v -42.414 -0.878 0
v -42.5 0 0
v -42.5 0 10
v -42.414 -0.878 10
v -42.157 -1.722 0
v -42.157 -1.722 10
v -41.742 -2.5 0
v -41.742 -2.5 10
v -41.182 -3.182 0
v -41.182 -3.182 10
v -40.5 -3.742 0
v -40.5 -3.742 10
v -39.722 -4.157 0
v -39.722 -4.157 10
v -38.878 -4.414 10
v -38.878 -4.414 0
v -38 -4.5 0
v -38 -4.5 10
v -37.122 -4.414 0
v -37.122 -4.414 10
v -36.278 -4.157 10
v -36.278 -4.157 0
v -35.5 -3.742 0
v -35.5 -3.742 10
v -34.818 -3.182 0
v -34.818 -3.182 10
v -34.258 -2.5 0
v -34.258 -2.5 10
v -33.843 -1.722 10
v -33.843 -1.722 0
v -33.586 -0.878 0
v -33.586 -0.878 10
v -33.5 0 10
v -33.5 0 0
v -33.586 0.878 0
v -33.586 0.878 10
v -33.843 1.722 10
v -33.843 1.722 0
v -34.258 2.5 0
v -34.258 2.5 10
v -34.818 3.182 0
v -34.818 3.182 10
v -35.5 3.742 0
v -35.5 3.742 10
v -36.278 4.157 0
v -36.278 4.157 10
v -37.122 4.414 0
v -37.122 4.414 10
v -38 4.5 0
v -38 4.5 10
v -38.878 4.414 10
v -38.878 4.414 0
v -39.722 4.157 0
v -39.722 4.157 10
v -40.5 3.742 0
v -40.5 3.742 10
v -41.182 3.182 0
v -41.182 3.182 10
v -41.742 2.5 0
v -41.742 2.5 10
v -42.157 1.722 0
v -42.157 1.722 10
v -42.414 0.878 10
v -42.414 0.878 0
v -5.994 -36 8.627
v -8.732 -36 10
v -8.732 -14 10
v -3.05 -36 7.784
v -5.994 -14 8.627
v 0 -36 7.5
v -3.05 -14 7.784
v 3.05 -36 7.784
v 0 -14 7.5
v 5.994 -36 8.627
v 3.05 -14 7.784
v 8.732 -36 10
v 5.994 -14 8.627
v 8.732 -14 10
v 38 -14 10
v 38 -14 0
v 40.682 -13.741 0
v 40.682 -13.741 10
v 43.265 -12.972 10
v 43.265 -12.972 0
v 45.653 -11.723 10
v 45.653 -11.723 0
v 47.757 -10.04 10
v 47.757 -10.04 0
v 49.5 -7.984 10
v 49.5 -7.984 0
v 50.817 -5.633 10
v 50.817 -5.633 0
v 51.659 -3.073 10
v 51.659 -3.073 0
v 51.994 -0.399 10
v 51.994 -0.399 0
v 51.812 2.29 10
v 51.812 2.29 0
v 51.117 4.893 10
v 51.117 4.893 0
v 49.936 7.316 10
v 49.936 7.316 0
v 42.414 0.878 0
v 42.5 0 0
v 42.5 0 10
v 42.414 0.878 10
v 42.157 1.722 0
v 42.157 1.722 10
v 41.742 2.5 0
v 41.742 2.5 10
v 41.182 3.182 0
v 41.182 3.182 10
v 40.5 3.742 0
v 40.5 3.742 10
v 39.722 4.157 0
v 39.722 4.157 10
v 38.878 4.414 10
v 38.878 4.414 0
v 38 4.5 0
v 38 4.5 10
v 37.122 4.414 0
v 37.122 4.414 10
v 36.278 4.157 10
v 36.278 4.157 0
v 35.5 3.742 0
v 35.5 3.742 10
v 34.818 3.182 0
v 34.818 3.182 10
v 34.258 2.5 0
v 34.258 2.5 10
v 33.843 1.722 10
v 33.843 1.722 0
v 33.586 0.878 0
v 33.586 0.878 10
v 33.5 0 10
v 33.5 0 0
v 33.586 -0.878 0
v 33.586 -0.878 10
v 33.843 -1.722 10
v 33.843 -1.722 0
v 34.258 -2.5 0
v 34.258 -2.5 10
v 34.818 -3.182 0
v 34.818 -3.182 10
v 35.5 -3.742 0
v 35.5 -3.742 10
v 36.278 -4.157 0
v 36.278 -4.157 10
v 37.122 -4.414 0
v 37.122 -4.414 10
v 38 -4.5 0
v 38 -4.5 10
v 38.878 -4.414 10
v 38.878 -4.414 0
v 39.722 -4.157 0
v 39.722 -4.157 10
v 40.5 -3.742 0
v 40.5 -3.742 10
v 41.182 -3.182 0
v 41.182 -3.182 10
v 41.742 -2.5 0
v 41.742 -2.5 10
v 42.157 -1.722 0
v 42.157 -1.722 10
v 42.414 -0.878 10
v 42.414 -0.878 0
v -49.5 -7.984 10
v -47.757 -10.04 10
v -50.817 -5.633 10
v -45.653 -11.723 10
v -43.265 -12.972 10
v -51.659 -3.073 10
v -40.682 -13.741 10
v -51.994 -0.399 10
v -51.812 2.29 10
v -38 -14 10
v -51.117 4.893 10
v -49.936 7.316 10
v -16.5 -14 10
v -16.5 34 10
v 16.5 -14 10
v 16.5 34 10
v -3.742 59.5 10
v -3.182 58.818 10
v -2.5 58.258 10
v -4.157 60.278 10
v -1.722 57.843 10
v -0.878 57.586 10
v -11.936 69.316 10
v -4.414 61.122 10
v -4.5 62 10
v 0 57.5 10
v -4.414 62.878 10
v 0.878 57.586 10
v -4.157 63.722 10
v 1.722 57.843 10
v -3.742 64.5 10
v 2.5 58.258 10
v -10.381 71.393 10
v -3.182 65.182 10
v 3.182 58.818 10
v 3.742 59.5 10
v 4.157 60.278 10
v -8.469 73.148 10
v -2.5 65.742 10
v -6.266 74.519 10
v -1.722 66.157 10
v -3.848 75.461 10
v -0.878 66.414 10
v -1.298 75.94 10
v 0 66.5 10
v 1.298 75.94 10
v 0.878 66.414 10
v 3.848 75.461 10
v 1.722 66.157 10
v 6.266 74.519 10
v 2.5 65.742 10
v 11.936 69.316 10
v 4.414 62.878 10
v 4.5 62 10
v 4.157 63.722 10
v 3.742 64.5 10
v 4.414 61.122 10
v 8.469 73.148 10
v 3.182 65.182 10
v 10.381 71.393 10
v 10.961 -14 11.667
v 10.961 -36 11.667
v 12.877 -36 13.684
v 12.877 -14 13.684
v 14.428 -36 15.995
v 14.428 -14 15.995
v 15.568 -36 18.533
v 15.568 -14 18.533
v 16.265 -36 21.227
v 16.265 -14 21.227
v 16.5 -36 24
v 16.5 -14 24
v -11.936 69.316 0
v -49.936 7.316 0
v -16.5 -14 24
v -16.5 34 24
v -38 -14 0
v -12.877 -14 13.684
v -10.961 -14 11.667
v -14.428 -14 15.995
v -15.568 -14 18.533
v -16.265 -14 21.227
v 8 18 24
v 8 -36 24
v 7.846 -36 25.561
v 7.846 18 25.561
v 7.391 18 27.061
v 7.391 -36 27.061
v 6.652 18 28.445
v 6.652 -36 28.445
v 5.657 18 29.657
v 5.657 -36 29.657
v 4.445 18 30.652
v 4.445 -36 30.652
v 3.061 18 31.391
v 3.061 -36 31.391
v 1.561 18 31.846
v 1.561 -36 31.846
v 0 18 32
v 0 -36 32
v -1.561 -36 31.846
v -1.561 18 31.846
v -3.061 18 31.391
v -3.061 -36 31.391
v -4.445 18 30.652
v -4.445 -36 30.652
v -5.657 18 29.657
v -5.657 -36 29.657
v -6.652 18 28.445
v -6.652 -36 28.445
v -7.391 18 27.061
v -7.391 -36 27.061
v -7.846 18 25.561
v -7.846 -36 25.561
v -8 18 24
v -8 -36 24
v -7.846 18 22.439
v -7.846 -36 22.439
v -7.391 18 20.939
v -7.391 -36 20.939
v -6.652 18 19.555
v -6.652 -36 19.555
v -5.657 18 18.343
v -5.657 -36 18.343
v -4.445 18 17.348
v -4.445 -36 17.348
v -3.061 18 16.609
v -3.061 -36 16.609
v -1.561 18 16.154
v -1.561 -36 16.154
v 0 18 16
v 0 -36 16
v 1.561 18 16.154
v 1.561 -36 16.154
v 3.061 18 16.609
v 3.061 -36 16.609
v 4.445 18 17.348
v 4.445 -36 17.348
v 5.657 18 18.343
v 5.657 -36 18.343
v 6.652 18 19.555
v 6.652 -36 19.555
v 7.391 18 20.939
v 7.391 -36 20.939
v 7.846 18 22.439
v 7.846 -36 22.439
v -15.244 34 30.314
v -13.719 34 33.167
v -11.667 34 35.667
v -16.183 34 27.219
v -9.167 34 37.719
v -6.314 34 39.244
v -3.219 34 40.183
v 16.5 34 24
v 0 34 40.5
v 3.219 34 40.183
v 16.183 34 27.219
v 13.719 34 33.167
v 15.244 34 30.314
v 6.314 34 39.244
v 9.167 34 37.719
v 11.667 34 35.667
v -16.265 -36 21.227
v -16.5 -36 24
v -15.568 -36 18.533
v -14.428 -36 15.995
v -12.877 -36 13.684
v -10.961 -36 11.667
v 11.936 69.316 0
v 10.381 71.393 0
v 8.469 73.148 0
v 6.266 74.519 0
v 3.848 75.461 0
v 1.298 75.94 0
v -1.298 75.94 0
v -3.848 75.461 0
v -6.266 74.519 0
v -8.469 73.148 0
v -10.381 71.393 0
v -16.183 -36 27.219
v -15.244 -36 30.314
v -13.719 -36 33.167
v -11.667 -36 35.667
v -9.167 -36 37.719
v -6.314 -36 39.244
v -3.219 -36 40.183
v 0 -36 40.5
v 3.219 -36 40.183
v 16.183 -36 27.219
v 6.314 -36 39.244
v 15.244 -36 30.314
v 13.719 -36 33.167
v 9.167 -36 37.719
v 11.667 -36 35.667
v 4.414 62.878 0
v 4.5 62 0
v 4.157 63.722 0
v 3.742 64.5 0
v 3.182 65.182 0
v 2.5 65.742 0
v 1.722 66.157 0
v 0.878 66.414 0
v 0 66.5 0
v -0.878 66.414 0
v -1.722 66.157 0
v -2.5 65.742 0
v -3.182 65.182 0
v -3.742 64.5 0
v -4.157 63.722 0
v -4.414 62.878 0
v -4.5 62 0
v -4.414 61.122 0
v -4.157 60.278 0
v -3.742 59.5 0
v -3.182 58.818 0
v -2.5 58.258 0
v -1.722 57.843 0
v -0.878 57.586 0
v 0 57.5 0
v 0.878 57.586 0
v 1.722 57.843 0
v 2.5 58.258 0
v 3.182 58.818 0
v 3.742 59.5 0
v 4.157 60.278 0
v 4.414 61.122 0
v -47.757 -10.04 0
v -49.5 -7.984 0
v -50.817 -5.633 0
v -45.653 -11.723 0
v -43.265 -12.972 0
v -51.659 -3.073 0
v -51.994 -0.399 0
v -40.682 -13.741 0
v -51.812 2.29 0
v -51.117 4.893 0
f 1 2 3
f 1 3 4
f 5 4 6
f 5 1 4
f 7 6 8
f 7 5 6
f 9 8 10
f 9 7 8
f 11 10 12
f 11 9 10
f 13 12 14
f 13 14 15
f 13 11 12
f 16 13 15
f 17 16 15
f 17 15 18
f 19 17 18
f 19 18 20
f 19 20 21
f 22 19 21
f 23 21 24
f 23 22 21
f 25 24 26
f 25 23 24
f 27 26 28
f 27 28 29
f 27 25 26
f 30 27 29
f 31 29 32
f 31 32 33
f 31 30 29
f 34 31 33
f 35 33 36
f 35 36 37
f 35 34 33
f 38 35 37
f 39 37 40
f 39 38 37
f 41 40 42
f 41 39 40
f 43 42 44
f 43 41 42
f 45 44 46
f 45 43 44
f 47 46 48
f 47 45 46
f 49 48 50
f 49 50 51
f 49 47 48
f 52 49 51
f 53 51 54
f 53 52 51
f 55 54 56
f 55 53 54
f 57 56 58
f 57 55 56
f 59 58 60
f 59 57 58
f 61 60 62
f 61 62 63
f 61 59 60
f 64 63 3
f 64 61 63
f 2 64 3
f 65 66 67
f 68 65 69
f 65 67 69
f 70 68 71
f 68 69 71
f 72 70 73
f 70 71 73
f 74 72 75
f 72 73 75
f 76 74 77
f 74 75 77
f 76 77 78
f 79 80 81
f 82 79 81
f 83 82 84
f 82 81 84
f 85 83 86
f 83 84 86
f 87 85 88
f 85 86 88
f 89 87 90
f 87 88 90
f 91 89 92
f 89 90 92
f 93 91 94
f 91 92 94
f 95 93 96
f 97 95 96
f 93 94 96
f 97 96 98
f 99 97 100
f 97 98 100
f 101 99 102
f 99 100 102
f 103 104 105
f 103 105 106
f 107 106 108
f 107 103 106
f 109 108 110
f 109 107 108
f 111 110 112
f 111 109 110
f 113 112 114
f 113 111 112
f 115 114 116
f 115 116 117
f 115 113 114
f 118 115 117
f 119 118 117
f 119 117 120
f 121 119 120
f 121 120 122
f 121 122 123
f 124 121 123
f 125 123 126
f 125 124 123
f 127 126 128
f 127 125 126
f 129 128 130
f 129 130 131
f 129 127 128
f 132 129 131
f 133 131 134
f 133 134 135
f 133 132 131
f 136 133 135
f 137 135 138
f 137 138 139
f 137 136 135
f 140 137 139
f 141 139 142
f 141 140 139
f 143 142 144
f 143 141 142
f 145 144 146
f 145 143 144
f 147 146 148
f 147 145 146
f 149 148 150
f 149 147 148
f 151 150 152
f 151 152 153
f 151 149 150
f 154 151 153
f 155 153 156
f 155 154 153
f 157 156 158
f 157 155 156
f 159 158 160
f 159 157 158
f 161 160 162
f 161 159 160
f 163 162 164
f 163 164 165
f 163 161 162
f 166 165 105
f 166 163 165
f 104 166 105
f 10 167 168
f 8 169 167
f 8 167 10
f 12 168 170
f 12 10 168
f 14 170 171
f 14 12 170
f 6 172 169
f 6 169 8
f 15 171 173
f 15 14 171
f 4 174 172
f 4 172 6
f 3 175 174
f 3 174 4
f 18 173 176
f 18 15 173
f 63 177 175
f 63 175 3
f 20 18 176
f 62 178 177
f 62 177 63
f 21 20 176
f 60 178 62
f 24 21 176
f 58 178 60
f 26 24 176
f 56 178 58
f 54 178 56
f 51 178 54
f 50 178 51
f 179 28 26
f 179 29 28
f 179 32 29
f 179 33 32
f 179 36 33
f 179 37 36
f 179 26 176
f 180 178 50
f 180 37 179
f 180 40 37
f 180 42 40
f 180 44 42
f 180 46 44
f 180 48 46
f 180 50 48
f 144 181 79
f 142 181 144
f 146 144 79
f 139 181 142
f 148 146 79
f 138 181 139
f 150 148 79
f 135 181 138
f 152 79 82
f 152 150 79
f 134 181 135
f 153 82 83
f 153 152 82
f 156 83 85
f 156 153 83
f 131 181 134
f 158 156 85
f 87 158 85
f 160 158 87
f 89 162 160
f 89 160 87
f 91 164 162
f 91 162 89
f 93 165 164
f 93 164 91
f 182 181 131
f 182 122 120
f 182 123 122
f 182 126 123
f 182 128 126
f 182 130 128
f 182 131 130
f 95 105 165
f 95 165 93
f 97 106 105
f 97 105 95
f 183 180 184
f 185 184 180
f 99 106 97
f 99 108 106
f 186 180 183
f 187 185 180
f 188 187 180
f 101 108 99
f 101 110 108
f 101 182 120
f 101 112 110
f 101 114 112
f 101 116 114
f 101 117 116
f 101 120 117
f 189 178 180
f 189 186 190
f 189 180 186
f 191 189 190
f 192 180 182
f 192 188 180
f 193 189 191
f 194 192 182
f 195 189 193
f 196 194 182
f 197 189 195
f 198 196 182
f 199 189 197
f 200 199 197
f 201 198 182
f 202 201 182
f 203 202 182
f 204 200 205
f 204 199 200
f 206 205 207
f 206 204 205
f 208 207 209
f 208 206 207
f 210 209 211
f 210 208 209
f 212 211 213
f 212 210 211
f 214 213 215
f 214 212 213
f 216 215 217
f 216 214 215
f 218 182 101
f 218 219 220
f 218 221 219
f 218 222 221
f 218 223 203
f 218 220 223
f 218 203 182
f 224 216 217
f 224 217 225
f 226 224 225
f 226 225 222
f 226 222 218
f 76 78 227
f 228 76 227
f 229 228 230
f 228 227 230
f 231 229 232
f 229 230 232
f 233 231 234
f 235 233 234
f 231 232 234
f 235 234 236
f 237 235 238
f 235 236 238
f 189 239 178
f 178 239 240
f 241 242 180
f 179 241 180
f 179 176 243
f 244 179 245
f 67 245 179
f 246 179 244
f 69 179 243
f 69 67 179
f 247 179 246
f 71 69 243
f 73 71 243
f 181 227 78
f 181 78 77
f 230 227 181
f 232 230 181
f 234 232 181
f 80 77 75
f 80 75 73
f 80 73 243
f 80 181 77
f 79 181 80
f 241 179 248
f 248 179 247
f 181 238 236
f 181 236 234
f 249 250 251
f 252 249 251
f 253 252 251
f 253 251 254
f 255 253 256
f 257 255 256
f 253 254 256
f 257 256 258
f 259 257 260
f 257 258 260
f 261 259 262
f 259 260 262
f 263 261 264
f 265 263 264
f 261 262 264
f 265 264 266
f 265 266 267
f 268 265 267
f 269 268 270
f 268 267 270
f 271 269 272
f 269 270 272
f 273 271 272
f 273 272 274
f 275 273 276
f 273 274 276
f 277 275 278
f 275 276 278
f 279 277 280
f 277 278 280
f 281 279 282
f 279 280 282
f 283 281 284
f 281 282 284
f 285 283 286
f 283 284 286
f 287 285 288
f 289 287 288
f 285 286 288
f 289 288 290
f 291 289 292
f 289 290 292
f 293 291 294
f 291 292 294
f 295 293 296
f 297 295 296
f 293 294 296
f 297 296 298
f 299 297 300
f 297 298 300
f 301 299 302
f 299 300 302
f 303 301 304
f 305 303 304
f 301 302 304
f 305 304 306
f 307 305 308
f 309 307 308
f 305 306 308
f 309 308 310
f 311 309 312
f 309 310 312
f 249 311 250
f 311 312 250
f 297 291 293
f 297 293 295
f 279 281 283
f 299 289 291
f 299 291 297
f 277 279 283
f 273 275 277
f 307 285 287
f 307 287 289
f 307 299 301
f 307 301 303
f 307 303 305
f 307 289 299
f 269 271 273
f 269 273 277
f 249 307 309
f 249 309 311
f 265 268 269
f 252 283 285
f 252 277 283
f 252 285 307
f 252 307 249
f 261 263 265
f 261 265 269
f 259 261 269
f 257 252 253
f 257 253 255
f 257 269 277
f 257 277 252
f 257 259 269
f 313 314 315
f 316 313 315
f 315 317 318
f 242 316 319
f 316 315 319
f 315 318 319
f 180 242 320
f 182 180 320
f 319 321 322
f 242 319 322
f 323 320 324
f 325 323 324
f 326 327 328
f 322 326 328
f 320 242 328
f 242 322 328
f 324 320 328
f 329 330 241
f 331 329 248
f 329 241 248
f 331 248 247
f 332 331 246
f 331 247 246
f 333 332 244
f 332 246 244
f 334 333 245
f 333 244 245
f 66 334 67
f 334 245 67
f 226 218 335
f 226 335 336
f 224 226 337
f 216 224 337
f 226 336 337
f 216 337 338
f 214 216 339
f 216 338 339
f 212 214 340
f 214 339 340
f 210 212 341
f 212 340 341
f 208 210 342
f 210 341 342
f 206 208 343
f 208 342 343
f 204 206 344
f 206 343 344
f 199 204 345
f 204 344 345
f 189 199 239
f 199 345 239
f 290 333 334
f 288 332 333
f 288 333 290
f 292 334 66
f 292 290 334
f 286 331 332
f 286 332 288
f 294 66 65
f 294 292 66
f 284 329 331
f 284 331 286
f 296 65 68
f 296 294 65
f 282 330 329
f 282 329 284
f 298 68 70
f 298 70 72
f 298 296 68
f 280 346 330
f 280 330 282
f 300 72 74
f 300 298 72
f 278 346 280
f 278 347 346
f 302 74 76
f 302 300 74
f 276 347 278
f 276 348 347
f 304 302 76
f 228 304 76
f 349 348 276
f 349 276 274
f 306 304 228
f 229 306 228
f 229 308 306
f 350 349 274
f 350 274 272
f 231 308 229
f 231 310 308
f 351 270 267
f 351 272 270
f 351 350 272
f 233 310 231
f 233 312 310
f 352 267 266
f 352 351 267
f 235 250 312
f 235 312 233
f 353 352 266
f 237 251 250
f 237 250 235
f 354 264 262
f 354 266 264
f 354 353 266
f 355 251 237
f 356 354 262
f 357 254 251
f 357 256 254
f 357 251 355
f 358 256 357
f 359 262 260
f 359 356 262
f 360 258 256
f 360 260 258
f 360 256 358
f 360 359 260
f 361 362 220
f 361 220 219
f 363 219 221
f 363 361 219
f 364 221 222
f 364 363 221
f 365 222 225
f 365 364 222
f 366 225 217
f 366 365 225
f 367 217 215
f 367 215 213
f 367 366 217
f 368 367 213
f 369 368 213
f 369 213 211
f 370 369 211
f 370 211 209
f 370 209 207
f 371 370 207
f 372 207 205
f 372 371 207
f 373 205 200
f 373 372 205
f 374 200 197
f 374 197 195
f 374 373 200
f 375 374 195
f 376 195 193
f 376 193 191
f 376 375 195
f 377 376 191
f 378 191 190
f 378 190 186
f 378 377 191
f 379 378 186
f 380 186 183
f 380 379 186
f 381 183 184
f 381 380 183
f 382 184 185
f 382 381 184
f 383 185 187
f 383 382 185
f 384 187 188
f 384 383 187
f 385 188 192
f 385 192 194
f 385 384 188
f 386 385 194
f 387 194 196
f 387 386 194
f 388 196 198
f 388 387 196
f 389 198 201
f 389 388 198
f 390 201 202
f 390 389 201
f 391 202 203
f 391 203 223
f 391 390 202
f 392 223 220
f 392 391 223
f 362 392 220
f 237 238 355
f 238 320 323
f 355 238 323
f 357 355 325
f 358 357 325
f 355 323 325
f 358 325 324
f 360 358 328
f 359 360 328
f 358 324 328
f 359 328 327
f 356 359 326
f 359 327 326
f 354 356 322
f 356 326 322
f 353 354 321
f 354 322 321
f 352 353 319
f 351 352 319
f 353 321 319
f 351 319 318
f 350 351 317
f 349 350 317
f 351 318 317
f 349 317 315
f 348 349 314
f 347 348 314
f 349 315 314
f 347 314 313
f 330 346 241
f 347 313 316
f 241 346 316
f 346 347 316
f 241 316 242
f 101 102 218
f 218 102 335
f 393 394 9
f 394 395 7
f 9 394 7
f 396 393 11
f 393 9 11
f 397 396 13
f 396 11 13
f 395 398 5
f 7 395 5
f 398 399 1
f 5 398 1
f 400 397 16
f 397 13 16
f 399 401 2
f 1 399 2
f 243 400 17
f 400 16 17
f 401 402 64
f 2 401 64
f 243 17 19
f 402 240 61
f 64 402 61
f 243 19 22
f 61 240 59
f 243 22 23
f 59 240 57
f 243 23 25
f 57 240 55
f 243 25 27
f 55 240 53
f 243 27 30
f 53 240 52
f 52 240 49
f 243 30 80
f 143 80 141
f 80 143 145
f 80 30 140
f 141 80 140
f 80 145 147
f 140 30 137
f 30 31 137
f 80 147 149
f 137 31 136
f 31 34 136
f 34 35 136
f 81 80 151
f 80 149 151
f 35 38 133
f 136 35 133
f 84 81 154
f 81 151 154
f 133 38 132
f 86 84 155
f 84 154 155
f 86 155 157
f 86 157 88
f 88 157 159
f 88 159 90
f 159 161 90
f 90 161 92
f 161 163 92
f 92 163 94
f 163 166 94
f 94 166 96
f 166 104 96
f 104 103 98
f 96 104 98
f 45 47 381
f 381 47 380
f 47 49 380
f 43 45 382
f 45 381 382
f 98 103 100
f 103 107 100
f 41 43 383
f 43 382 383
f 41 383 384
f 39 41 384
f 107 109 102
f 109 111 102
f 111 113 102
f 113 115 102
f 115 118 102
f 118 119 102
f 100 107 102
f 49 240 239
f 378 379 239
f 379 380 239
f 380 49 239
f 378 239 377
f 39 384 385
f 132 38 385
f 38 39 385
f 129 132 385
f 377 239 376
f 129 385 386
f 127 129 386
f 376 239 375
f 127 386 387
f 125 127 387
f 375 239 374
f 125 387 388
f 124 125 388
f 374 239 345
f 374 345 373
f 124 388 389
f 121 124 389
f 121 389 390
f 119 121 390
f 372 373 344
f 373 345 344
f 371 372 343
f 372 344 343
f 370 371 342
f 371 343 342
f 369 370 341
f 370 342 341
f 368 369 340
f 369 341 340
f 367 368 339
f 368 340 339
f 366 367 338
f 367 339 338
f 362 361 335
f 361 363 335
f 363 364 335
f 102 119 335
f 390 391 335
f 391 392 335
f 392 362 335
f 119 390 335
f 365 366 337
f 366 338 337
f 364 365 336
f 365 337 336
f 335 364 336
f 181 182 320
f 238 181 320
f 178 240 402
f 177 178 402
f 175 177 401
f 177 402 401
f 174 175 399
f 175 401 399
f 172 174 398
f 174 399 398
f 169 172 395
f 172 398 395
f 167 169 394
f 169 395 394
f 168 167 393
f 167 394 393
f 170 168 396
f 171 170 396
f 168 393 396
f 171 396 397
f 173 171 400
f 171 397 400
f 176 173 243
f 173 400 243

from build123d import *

# Parameters (mm, degrees)
SKETCH1_R                = 4.5
BOSS_EXTRUDE1_DEPTH      = 10
BOSS_EXTRUDE2_DEPTH      = 22
BOSS_EXTRUDE2_DEPTH_BACK = 48
SKETCH2_R                = 16.5
BOSS_EXTRUDE3_DEPTH      = 48
SKETCH5_R                = 8
CUT_EXTRUDE1_DEPTH       = 54


with BuildPart() as part:
    # Sketch1 → Boss-Extrude1 (new body)
    with BuildSketch(Plane.XY):
        with BuildLine():
            Line((-38, -14), (38, -14))
            ThreePointArc((38, -14), (50.215198798, -6.840242563), (49.936417534, 7.315868811))
            Line((49.936417534, 7.315868811), (11.936417534, 69.315868811))
            ThreePointArc((11.936417534, 69.315868811), (0, 76), (-11.936417534, 69.315868811))
            Line((-11.936417534, 69.315868811), (-49.936417534, 7.315868811))
            ThreePointArc((-49.936417534, 7.315868811), (-50.215198798, -6.840242563), (-38, -14))
        make_face()
        with Locations((0, 62)):
            Circle(SKETCH1_R, mode=Mode.SUBTRACT)
        with Locations((38, 0)):
            Circle(SKETCH1_R, mode=Mode.SUBTRACT)
        with Locations((-38, 0)):
            Circle(SKETCH1_R, mode=Mode.SUBTRACT)
    extrude(amount=BOSS_EXTRUDE1_DEPTH)

    # Sketch2 → Boss-Extrude2 (add, two sides: drawn at the far end of the back side and taken through both)
    with BuildSketch(Plane.XZ.offset(14).offset(-BOSS_EXTRUDE2_DEPTH_BACK)):
        with Locations((0, 24)):
            Circle(SKETCH2_R)
    extrude(amount=BOSS_EXTRUDE2_DEPTH + BOSS_EXTRUDE2_DEPTH_BACK)

    # Sketch2<3> → Boss-Extrude3 (add)
    with BuildSketch(Plane.XZ.offset(14)):
        with BuildLine():
            Line((-16.5, 24), (-16.5, 10))
            Line((-16.5, 10), (-8.732124598, 10))
            ThreePointArc((-8.732124598, 10), (-14.427925282, 15.994691008), (-16.5, 24))
        make_face()
        with BuildLine():
            ThreePointArc((16.5, 24), (14.427925282, 15.994691008), (8.732124598, 10))
            Line((8.732124598, 10), (16.5, 10))
            Line((16.5, 10), (16.5, 24))
        make_face()
    extrude(amount=-BOSS_EXTRUDE3_DEPTH)

    # Sketch5 → Cut-Extrude1 (cut)
    with BuildSketch(Plane.XZ.offset(36)):
        with Locations((0, 24)):
            Circle(SKETCH5_R)
    extrude(amount=-CUT_EXTRUDE1_DEPTH, mode=Mode.SUBTRACT)


solid = part.part
